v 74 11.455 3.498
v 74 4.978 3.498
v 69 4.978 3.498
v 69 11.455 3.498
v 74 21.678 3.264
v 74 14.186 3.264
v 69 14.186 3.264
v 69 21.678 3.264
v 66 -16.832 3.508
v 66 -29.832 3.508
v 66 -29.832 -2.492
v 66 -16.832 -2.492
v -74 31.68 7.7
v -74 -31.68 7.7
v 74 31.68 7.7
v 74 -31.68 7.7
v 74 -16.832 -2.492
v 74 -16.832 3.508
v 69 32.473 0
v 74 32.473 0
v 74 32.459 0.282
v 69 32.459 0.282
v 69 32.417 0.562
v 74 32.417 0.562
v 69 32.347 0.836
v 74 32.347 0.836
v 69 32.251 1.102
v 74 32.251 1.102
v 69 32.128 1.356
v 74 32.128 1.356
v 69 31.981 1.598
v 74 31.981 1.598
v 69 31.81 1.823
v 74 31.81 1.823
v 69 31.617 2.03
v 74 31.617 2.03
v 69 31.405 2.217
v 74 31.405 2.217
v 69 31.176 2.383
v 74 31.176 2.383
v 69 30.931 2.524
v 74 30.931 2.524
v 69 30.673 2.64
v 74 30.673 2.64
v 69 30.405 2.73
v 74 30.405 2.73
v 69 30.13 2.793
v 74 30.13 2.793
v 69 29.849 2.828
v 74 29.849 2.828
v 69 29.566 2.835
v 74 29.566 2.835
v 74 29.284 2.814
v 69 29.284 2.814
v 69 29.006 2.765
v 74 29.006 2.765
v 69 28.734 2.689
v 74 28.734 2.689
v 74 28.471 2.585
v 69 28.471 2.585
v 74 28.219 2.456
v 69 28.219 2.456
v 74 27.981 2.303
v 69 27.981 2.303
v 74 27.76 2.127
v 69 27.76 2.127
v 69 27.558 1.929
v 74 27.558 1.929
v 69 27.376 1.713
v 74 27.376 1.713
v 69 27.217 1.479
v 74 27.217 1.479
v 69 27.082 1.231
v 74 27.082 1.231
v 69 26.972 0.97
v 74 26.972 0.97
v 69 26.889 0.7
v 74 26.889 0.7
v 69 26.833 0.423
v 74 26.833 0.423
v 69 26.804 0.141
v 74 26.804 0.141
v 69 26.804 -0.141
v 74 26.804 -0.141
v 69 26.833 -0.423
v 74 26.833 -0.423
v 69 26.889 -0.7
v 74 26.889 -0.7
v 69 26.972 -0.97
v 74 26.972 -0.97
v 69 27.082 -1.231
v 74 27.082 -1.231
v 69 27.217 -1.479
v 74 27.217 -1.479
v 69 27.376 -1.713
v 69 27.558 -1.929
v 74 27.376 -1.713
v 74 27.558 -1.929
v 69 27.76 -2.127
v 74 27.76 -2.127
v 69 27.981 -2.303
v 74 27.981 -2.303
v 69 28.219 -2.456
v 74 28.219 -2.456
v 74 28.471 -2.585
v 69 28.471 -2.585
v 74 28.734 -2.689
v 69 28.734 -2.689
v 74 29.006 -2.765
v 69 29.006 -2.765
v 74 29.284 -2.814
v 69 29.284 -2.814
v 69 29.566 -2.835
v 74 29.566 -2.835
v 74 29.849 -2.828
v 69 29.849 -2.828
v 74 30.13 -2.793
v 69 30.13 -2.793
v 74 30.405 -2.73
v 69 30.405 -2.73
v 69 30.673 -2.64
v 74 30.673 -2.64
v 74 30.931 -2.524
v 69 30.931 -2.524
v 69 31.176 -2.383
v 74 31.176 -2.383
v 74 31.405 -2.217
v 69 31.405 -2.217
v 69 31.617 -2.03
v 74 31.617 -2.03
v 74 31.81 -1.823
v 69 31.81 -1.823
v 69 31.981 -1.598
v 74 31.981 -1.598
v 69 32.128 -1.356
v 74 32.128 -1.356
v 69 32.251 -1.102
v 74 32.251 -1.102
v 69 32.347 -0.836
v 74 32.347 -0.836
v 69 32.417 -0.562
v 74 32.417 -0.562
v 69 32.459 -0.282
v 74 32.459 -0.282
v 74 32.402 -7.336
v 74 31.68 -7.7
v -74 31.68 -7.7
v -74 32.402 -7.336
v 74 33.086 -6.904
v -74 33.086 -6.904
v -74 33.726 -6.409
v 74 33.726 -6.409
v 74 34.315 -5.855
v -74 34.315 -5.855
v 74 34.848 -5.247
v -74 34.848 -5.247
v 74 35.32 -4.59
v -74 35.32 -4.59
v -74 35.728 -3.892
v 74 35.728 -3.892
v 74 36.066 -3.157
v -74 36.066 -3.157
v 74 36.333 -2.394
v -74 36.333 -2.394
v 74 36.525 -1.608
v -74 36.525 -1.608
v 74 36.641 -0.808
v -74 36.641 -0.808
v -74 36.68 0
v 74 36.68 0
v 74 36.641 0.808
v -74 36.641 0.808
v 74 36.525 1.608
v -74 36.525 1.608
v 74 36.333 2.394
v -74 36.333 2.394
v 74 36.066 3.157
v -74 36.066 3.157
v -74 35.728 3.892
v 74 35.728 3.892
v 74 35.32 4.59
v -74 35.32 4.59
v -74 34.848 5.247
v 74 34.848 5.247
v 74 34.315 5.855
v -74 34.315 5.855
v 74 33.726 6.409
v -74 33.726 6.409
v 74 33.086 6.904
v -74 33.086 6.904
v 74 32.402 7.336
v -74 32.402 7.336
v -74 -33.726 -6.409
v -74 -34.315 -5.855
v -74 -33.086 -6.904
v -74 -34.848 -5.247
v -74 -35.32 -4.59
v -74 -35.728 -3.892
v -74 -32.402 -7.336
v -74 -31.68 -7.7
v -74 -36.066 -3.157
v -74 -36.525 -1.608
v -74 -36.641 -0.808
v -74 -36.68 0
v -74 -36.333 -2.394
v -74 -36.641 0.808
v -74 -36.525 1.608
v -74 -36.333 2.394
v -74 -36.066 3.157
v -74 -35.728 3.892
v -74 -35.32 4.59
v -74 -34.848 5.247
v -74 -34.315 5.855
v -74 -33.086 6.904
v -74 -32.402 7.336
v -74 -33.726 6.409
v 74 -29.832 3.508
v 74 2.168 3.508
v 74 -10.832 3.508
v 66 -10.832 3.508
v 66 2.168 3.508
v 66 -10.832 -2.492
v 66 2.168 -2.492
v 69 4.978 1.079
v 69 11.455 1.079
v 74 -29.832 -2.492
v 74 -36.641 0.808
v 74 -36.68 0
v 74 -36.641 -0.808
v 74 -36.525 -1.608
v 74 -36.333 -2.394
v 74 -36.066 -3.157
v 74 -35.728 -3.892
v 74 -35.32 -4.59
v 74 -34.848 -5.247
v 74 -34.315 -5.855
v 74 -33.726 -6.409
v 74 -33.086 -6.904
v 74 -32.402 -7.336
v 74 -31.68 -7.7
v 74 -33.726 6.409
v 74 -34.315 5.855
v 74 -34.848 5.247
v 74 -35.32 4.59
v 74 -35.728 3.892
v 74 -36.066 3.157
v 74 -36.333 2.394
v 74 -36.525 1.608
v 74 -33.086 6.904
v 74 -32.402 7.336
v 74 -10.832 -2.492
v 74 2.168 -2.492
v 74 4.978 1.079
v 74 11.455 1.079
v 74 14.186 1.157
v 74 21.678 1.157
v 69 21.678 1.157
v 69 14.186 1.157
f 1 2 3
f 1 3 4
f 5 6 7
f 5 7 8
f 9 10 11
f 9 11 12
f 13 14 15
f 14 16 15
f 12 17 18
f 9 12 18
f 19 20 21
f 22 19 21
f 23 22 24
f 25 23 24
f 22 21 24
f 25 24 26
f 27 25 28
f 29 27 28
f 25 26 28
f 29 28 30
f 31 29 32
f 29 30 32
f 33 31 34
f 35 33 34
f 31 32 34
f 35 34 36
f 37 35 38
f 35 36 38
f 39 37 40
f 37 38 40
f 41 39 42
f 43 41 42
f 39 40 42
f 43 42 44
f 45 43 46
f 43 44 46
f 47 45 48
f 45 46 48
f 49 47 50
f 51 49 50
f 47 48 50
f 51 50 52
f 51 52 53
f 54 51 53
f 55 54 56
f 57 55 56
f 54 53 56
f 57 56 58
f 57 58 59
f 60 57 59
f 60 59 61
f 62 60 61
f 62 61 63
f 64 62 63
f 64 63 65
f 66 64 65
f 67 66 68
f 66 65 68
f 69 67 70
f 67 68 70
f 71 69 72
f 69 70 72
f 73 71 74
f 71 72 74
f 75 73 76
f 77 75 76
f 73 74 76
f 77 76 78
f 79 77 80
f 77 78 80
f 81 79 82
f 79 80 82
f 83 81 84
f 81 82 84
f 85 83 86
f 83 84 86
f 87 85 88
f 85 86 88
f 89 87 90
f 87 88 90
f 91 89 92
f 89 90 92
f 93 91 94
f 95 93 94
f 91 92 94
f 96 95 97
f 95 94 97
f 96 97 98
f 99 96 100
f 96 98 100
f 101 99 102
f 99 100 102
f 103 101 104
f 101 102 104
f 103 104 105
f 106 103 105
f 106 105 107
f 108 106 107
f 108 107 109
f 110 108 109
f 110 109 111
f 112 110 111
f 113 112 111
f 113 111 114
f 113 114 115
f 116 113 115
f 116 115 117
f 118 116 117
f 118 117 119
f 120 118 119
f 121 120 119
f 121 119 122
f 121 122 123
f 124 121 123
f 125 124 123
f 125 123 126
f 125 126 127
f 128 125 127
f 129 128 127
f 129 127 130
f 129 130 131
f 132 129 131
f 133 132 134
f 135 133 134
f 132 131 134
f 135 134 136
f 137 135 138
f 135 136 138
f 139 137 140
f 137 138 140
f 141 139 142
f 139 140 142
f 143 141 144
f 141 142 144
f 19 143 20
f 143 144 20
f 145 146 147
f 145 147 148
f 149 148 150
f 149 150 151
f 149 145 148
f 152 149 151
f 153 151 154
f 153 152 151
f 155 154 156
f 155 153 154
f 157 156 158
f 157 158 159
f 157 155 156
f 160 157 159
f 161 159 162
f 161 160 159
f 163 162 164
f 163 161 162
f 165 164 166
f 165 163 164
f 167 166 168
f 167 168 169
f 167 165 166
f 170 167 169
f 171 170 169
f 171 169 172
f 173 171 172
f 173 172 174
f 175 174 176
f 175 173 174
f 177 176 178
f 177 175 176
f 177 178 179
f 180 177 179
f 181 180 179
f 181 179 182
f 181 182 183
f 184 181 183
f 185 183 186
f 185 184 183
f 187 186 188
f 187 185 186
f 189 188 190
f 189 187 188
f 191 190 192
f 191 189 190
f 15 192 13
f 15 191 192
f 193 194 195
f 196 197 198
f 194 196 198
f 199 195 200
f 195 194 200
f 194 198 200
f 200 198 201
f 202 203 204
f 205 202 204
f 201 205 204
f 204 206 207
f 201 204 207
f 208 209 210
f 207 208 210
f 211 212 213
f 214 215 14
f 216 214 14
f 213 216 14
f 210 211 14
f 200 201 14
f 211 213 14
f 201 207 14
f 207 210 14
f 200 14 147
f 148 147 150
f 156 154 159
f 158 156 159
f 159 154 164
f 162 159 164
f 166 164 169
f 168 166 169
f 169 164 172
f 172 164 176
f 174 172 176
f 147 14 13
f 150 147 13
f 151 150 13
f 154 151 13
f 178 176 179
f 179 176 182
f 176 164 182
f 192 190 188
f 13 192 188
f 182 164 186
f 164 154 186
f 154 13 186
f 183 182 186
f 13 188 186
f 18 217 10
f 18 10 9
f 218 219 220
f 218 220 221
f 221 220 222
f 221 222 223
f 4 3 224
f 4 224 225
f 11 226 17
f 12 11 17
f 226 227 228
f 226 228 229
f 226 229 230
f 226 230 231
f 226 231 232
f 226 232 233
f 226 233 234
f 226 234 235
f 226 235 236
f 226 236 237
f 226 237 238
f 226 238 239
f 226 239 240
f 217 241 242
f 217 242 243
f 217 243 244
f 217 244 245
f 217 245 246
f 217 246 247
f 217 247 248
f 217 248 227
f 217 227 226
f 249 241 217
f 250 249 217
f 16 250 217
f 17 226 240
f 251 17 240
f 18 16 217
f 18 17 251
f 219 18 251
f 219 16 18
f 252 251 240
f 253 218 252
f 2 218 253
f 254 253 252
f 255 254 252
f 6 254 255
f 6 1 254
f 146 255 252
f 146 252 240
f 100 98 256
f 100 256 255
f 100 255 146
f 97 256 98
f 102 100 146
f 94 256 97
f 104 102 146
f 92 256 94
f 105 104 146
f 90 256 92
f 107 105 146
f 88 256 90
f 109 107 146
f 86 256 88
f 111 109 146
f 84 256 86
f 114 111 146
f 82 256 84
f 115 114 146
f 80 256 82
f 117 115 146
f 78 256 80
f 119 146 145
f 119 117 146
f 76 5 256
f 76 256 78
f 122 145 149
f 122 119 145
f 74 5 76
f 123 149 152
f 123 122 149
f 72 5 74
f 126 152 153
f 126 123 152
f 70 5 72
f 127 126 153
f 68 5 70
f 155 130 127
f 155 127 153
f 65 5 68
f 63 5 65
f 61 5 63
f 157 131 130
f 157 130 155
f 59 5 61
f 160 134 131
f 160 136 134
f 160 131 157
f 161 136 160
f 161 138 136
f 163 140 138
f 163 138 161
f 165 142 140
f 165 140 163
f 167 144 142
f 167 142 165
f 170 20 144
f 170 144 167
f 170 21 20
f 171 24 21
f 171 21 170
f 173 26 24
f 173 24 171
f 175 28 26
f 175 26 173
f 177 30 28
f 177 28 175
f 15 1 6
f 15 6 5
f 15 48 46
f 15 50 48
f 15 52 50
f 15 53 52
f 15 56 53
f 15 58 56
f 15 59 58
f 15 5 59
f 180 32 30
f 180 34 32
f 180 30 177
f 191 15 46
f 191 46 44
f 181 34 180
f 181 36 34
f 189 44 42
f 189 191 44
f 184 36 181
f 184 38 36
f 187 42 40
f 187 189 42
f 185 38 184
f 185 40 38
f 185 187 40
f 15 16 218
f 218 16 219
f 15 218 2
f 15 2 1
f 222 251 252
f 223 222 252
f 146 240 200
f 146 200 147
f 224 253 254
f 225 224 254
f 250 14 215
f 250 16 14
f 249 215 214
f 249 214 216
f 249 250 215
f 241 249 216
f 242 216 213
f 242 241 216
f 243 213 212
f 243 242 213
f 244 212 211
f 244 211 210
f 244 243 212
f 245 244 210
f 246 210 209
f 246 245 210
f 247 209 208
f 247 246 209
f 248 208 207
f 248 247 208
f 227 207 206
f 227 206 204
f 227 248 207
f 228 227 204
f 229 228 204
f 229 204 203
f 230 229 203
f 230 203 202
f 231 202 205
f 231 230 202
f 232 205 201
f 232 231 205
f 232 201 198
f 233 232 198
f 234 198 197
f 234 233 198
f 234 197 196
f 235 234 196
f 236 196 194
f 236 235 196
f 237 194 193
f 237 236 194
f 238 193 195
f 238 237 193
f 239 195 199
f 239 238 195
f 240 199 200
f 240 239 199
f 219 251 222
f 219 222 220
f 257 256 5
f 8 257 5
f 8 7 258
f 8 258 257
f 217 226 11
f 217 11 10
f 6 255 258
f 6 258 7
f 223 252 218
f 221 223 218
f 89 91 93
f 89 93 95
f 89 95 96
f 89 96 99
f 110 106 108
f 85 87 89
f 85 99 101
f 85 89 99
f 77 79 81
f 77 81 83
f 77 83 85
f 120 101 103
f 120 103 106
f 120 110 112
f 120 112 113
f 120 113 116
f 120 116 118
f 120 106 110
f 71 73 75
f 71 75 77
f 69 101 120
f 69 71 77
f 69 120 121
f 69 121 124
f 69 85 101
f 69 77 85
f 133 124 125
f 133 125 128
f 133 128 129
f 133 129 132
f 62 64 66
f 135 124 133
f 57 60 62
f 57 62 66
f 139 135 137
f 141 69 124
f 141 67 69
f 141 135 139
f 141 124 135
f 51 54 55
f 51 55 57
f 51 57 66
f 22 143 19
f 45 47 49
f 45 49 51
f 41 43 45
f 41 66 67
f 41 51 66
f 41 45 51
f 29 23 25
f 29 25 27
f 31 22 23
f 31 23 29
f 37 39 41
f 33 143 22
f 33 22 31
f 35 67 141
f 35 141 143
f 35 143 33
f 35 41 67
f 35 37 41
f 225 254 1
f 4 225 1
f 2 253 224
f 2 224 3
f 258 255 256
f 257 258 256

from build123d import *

# Parameters (mm, degrees)
PAD_DEPTH           = 74
SKETCH001_W         = 13
SKETCH001_H         = 6
POCKET_DEPTH        = 8
LINEARPATTERN_COUNT = 2
LINEARPATTERN_PITCH = 19
SKETCH002_R         = 2.836223
SKETCH002_W         = 6.476894
SKETCH002_H         = 2.419083
SKETCH002_W_2       = 7.491354
SKETCH002_H_2       = 2.106944
POCKET001_DEPTH     = 5


with BuildPart() as part:
    # Sketch → Pad (new body, symmetric)
    with BuildSketch(Plane.YZ):
        with BuildLine():
            ThreePointArc((-31.68, 7.7), (-36.68, 0), (-31.68, -7.7))
            Line((-31.68, -7.7), (31.68, -7.7))
            ThreePointArc((31.68, -7.7), (36.68, 0), (31.68, 7.7))
            Line((-31.68, 7.7), (31.68, 7.7))
        make_face()
    extrude(amount=PAD_DEPTH, both=True)

    # Sketch001 (on DatumPlane) → Pocket (cut)
    with BuildSketch(Plane.YZ.offset(74)):
        with Locations((-23.331998, 0.508297)):
            Rectangle(SKETCH001_W, SKETCH001_H)
    pocket = extrude(amount=-POCKET_DEPTH, mode=Mode.SUBTRACT)

    # LinearPattern: Pocket ×2
    with Locations(*[(0, i * LINEARPATTERN_PITCH, 0) for i in range(1, LINEARPATTERN_COUNT)]):
        add(pocket, mode=Mode.SUBTRACT)

    # Sketch002 (on DatumPlane) → Pocket001 (cut)
    with BuildSketch(Plane.YZ.offset(74)):
        with Locations((29.637125, 0)):
            Circle(SKETCH002_R)
        with Locations((8.216534, 2.288247)):
            Rectangle(SKETCH002_W, SKETCH002_H)
        with Locations((17.931886, 2.210213)):
            Rectangle(SKETCH002_W_2, SKETCH002_H_2)
    extrude(amount=-POCKET001_DEPTH, mode=Mode.SUBTRACT)


solid = part.part
